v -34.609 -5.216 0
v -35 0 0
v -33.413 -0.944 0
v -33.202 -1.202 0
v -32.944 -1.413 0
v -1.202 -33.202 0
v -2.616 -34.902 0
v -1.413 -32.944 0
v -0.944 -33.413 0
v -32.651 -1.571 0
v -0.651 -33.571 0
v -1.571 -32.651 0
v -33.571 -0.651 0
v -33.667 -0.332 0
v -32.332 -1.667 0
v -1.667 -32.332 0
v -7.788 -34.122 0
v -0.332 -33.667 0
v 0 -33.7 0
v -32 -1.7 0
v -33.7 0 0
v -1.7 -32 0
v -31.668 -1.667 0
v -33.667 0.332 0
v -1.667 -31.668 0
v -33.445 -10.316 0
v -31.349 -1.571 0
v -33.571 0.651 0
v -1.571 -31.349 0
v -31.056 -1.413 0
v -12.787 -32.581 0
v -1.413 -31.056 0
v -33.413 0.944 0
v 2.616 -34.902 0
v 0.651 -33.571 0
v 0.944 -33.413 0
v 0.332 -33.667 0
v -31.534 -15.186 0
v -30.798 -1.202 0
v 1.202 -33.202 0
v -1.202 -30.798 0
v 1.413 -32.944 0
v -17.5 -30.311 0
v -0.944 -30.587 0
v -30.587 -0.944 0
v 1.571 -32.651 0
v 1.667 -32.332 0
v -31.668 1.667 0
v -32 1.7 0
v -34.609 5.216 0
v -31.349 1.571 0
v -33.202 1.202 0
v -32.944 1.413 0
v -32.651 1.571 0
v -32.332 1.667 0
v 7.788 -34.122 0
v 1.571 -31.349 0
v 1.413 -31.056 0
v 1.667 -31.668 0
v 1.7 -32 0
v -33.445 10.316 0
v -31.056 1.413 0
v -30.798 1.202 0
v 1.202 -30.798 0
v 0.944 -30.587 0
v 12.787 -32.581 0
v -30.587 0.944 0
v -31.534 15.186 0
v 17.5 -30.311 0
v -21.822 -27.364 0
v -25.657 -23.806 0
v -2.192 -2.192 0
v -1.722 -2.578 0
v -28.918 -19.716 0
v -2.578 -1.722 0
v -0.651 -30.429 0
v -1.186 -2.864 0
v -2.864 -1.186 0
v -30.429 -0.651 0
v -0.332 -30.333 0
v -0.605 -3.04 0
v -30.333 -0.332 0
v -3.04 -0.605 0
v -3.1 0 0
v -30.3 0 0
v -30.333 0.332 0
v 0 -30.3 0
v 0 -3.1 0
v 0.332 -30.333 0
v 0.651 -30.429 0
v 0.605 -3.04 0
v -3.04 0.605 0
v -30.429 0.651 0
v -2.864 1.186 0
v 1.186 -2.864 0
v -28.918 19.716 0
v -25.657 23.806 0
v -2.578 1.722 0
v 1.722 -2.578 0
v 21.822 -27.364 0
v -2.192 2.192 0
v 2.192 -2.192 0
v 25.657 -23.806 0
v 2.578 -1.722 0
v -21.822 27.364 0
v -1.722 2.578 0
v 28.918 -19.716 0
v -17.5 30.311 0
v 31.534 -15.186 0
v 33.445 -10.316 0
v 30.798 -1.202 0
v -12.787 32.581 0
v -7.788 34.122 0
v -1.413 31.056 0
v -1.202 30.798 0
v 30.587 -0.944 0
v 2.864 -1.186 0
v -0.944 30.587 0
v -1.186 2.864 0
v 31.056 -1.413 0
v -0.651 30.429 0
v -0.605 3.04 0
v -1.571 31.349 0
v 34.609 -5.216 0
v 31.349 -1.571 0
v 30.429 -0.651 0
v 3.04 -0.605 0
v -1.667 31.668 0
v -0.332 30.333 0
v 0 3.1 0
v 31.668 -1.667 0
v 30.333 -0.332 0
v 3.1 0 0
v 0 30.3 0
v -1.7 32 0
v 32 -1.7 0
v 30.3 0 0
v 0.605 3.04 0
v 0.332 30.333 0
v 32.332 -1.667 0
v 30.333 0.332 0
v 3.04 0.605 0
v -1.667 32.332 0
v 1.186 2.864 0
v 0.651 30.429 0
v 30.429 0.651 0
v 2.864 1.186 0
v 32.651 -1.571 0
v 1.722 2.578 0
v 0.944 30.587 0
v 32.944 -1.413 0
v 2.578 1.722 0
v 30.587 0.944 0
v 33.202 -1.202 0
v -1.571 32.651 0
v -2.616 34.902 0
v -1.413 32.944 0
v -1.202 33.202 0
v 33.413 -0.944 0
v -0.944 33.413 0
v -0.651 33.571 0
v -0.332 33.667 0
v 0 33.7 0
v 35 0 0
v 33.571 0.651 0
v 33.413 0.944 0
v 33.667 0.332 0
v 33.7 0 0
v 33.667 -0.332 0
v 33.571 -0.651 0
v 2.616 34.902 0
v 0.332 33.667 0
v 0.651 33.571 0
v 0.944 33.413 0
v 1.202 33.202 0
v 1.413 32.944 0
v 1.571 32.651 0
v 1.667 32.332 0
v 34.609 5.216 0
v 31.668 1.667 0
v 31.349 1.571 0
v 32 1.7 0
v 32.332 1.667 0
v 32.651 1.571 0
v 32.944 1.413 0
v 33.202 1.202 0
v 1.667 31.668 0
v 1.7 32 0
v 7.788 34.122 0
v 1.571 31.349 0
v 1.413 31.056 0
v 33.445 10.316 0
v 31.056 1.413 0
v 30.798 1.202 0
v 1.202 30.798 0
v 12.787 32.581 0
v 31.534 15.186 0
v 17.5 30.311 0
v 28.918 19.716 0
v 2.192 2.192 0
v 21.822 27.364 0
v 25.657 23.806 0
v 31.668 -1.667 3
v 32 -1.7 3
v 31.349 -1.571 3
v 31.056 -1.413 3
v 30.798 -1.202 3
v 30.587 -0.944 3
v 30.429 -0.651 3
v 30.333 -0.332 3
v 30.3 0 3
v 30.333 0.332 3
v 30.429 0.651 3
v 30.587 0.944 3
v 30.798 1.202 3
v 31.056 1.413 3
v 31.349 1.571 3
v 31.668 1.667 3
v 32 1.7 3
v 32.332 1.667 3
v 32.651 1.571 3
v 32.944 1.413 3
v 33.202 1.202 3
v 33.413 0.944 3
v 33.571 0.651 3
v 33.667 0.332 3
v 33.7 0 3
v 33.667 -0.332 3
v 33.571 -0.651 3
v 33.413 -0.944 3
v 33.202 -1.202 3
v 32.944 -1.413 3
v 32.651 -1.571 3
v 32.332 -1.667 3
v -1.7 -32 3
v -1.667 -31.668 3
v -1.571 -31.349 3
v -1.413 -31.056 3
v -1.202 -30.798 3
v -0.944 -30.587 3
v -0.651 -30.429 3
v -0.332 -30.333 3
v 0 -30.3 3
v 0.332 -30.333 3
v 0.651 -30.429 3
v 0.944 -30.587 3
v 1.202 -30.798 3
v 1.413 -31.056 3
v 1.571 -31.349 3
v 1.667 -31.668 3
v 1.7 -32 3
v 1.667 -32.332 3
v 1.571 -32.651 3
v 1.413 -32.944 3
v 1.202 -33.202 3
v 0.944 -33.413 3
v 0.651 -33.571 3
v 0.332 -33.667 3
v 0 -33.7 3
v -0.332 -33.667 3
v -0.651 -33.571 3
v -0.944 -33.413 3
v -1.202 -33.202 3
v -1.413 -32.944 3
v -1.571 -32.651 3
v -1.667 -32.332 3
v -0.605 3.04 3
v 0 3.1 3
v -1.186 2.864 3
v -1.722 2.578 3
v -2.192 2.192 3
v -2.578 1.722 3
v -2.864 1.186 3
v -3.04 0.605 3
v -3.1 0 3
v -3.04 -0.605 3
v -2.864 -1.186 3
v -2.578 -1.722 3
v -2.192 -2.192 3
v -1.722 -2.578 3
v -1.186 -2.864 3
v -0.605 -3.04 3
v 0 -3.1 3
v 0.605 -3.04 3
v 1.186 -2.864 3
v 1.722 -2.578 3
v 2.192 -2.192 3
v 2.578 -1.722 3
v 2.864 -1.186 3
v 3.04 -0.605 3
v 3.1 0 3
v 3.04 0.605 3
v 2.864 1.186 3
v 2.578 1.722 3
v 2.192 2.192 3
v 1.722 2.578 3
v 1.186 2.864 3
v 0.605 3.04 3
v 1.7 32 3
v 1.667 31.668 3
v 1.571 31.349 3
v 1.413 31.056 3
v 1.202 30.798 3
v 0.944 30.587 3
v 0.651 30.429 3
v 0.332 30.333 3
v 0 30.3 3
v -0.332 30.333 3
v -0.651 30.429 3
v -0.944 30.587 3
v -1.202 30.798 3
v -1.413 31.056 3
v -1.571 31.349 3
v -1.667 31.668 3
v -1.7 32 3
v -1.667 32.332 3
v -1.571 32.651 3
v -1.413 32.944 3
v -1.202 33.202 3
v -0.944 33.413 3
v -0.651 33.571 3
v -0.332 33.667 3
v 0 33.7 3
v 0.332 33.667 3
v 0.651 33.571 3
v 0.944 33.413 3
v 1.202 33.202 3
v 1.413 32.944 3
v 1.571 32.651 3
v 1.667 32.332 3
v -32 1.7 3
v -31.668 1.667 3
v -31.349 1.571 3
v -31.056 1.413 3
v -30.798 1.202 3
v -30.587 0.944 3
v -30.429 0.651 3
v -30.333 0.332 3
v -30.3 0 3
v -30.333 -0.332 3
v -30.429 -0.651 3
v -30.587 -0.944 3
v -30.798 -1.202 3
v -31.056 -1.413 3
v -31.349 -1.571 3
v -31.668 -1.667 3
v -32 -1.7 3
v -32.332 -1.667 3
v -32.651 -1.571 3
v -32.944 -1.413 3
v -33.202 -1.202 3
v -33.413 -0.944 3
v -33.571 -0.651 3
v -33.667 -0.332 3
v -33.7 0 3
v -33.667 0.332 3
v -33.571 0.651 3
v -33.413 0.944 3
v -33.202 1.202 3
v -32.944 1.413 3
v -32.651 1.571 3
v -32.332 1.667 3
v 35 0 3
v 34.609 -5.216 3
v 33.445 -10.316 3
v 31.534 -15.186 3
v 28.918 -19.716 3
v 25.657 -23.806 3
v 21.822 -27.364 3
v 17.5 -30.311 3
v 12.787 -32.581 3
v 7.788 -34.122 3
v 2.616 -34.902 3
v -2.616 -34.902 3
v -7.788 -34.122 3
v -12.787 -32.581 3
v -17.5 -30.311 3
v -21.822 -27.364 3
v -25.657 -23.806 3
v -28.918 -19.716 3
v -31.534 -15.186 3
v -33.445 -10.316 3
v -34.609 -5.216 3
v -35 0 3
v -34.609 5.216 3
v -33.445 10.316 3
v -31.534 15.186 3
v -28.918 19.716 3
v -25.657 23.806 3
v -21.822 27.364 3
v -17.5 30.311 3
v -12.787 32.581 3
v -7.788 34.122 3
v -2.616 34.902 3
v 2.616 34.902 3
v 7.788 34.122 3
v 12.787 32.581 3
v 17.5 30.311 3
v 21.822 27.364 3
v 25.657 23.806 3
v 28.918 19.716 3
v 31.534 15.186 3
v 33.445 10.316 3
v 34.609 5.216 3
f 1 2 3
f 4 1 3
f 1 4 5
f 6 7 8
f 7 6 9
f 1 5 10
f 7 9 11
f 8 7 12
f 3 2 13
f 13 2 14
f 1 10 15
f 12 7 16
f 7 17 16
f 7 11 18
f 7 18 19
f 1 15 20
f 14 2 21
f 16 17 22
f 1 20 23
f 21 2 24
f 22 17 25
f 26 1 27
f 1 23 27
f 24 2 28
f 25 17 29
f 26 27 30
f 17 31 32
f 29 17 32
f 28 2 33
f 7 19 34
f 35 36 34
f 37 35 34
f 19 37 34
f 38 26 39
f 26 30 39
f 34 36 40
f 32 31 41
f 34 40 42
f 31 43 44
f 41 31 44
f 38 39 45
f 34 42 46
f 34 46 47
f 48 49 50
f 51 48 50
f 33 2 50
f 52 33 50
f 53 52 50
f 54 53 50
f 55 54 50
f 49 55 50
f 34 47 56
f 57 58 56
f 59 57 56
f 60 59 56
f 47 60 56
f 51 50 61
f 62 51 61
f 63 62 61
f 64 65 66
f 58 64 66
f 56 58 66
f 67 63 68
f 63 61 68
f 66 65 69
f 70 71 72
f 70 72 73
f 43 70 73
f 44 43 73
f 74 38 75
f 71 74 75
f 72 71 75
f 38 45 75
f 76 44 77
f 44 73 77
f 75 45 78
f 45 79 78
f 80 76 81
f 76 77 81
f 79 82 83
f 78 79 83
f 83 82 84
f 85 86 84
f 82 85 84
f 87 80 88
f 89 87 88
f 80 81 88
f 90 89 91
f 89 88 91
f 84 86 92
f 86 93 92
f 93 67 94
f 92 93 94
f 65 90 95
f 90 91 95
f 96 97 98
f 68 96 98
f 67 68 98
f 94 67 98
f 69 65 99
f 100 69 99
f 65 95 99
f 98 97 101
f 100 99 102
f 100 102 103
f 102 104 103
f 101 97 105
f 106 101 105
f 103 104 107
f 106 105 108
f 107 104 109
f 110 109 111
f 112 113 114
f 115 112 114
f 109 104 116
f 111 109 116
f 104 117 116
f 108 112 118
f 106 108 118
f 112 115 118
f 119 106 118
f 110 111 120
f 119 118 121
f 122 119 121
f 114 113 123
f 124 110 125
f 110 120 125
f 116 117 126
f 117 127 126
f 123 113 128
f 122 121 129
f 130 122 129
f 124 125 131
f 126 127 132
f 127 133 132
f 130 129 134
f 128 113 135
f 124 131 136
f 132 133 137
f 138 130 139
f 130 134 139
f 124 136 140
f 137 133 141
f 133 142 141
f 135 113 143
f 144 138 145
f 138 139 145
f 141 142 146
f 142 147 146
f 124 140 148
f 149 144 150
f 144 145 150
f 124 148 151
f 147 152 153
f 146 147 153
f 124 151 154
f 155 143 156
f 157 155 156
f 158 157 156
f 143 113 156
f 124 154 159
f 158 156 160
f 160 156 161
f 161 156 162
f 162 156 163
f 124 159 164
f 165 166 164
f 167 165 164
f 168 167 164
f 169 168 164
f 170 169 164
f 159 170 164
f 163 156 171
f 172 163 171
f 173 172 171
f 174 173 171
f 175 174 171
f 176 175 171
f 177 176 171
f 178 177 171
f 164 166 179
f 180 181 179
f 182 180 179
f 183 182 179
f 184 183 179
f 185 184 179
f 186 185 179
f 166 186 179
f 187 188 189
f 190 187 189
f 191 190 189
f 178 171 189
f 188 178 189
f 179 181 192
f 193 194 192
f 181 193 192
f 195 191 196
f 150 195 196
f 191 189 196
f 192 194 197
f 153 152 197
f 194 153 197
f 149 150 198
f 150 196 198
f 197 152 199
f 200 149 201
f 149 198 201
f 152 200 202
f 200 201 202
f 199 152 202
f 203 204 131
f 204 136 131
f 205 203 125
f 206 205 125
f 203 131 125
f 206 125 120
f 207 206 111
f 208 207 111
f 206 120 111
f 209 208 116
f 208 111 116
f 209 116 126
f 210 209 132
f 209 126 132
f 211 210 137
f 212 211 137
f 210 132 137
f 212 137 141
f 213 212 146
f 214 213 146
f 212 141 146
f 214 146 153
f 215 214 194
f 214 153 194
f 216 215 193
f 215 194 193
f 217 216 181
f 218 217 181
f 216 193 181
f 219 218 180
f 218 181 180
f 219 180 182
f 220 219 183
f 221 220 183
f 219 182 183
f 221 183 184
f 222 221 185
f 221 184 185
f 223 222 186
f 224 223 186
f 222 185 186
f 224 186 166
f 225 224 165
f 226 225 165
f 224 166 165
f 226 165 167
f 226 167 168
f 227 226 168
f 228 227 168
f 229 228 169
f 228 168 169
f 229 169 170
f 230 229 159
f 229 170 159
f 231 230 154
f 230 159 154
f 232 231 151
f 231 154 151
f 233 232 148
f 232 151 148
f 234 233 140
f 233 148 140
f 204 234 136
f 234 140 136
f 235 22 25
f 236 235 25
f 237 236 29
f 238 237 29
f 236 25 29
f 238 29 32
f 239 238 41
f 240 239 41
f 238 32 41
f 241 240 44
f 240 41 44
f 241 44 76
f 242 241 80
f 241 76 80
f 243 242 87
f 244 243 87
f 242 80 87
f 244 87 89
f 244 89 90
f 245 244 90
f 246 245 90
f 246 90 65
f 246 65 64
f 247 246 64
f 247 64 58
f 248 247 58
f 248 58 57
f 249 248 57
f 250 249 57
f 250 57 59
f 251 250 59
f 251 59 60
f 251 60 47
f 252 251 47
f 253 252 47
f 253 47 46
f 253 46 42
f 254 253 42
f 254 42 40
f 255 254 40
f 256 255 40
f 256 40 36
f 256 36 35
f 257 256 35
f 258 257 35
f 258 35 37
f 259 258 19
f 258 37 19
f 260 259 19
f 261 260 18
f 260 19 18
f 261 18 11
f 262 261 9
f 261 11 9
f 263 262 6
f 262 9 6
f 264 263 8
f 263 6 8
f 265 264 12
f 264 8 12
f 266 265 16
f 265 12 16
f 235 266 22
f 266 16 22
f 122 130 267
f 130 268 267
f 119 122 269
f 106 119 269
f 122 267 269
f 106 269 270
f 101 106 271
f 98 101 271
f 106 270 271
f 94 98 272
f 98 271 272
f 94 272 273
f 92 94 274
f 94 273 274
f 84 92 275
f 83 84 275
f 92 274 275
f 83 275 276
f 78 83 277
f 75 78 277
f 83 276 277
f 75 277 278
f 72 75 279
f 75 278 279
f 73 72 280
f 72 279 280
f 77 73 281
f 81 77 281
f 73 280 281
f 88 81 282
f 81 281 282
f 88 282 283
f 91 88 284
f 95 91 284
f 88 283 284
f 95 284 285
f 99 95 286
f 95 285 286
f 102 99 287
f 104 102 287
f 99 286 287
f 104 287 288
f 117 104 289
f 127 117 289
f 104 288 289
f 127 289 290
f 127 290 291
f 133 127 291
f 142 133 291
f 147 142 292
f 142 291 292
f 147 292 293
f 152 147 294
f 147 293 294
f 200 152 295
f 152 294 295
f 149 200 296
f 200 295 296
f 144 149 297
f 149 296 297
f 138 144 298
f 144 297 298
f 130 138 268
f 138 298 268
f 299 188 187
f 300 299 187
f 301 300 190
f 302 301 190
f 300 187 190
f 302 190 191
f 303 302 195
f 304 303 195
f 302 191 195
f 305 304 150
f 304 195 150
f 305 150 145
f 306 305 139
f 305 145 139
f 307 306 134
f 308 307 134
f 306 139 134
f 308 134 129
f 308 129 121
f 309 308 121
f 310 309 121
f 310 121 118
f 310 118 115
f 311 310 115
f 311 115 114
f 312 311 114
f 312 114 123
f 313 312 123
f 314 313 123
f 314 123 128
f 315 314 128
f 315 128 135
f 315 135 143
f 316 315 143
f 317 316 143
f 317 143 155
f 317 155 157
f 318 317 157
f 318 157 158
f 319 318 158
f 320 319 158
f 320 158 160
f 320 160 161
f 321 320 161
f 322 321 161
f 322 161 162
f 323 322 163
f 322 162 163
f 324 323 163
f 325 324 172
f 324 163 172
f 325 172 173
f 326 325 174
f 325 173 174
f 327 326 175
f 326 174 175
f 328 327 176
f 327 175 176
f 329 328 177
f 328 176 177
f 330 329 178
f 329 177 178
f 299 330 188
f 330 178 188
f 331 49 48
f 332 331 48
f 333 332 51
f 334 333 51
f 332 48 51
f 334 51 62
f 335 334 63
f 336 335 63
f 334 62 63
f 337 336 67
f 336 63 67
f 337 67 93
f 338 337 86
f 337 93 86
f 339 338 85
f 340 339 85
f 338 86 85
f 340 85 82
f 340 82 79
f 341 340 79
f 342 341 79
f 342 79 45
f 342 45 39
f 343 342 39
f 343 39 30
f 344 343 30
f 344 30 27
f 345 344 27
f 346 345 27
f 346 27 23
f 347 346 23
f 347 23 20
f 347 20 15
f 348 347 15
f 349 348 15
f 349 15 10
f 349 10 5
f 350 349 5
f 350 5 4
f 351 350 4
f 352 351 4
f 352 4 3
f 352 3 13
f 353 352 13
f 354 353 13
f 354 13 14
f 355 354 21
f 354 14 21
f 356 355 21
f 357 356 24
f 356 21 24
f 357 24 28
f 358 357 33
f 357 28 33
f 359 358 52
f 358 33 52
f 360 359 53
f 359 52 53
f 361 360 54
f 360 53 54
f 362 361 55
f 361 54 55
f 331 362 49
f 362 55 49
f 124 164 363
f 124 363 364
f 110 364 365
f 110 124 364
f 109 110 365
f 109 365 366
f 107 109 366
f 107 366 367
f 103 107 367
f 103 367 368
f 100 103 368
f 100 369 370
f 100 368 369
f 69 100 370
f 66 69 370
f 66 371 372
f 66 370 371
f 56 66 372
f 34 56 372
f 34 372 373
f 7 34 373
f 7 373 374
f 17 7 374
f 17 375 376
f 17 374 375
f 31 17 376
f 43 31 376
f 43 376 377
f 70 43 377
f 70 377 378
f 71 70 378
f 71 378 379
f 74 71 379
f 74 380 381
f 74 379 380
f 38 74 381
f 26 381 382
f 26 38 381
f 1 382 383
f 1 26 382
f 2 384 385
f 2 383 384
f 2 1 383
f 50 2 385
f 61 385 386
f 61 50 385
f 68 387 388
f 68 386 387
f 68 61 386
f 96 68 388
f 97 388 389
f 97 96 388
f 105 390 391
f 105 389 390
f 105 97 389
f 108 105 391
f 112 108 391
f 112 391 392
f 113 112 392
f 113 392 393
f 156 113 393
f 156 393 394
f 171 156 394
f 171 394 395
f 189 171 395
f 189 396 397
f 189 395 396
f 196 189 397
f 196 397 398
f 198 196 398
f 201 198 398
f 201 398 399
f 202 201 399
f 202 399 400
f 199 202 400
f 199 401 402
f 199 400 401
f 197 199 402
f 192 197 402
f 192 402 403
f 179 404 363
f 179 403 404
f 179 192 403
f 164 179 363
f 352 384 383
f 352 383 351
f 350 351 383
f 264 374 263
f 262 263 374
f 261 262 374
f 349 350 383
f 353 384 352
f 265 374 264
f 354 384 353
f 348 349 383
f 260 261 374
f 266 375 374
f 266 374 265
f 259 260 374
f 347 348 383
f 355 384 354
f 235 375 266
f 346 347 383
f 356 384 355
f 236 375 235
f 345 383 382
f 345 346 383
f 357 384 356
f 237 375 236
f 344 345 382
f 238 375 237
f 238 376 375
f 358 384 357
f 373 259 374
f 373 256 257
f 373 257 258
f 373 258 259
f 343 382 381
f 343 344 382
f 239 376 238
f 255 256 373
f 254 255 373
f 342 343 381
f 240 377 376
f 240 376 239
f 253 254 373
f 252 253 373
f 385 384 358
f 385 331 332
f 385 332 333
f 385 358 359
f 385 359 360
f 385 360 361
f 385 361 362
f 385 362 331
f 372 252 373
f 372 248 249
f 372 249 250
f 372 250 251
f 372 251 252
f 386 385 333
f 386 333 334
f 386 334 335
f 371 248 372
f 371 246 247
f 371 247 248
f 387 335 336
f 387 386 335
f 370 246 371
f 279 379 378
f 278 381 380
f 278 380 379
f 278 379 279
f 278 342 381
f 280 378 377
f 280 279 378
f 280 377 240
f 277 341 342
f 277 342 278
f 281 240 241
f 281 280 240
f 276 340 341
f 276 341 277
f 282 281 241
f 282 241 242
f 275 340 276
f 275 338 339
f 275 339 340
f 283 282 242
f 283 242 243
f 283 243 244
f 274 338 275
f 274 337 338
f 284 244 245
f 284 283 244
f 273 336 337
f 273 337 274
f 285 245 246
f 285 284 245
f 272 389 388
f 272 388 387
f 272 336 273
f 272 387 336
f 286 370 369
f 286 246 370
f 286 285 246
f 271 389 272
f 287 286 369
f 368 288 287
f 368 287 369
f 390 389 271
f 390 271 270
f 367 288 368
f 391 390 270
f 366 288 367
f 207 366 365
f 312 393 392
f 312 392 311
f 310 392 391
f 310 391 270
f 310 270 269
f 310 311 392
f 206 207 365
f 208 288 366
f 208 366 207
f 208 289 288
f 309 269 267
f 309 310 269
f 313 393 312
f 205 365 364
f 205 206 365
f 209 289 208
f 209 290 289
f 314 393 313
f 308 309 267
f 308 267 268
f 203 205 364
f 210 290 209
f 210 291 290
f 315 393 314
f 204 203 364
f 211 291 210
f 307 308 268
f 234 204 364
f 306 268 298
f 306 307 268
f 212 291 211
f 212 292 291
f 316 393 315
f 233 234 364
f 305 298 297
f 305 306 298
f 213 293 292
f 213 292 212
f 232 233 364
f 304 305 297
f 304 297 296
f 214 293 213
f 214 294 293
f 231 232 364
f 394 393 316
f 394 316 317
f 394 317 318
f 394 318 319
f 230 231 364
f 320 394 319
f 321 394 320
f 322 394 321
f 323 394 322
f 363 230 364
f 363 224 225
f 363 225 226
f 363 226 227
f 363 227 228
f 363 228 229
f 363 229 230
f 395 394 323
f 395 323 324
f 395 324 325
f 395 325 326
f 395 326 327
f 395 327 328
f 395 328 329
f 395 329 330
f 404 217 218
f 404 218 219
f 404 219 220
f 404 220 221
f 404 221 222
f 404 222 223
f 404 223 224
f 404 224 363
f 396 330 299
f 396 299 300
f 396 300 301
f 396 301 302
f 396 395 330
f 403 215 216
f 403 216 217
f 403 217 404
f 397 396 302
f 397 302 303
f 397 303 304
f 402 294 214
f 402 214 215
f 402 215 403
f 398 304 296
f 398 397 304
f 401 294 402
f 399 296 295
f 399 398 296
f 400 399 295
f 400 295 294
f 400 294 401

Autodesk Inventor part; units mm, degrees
ref_plane "YZ Plane" through (0, 0, 0) normal (1, 0, 0) x (0, 1, 0)
ref_plane "XZ Plane" through (0, 0, 0) normal (0, 1, 0) x (-1, 0, 0)
ref_plane "XY Plane" through (0, 0, 0) normal (0, 0, 1) x (1, 0, 0)
sketch "Sketch1" plane through (0, 0, 0) normal (0, 0, 1) x (1, 0, 0)
  circle A0 centre (0, 0) radius 35
  dimension "d0" = 70
extrude "Extrusion1" add sketch "Sketch1" along normal blind 3
sketch "Sketch2" plane through (0, 0, 3) normal (0, 0, 1) x (1, 0, 0)
  circle A0 centre (0, 0) radius 32 construction
  point P0 (32, 0)
  dimension "d3" = 64
hole "Hole1" at (32, 0, 3) direction (0, 0, -1) diameter 3.4 depth 10 tip angle 118
pattern_circular "Circular Pattern1" count 4 over 360 about axis through (0, 0, 0) along (0, 0, 1) of "Hole1"
hole "Hole2" at (0, 0, 0) direction (0, 0, 1) diameter 6.2 end through all
properties part number "anode_holder" material "Copper"
